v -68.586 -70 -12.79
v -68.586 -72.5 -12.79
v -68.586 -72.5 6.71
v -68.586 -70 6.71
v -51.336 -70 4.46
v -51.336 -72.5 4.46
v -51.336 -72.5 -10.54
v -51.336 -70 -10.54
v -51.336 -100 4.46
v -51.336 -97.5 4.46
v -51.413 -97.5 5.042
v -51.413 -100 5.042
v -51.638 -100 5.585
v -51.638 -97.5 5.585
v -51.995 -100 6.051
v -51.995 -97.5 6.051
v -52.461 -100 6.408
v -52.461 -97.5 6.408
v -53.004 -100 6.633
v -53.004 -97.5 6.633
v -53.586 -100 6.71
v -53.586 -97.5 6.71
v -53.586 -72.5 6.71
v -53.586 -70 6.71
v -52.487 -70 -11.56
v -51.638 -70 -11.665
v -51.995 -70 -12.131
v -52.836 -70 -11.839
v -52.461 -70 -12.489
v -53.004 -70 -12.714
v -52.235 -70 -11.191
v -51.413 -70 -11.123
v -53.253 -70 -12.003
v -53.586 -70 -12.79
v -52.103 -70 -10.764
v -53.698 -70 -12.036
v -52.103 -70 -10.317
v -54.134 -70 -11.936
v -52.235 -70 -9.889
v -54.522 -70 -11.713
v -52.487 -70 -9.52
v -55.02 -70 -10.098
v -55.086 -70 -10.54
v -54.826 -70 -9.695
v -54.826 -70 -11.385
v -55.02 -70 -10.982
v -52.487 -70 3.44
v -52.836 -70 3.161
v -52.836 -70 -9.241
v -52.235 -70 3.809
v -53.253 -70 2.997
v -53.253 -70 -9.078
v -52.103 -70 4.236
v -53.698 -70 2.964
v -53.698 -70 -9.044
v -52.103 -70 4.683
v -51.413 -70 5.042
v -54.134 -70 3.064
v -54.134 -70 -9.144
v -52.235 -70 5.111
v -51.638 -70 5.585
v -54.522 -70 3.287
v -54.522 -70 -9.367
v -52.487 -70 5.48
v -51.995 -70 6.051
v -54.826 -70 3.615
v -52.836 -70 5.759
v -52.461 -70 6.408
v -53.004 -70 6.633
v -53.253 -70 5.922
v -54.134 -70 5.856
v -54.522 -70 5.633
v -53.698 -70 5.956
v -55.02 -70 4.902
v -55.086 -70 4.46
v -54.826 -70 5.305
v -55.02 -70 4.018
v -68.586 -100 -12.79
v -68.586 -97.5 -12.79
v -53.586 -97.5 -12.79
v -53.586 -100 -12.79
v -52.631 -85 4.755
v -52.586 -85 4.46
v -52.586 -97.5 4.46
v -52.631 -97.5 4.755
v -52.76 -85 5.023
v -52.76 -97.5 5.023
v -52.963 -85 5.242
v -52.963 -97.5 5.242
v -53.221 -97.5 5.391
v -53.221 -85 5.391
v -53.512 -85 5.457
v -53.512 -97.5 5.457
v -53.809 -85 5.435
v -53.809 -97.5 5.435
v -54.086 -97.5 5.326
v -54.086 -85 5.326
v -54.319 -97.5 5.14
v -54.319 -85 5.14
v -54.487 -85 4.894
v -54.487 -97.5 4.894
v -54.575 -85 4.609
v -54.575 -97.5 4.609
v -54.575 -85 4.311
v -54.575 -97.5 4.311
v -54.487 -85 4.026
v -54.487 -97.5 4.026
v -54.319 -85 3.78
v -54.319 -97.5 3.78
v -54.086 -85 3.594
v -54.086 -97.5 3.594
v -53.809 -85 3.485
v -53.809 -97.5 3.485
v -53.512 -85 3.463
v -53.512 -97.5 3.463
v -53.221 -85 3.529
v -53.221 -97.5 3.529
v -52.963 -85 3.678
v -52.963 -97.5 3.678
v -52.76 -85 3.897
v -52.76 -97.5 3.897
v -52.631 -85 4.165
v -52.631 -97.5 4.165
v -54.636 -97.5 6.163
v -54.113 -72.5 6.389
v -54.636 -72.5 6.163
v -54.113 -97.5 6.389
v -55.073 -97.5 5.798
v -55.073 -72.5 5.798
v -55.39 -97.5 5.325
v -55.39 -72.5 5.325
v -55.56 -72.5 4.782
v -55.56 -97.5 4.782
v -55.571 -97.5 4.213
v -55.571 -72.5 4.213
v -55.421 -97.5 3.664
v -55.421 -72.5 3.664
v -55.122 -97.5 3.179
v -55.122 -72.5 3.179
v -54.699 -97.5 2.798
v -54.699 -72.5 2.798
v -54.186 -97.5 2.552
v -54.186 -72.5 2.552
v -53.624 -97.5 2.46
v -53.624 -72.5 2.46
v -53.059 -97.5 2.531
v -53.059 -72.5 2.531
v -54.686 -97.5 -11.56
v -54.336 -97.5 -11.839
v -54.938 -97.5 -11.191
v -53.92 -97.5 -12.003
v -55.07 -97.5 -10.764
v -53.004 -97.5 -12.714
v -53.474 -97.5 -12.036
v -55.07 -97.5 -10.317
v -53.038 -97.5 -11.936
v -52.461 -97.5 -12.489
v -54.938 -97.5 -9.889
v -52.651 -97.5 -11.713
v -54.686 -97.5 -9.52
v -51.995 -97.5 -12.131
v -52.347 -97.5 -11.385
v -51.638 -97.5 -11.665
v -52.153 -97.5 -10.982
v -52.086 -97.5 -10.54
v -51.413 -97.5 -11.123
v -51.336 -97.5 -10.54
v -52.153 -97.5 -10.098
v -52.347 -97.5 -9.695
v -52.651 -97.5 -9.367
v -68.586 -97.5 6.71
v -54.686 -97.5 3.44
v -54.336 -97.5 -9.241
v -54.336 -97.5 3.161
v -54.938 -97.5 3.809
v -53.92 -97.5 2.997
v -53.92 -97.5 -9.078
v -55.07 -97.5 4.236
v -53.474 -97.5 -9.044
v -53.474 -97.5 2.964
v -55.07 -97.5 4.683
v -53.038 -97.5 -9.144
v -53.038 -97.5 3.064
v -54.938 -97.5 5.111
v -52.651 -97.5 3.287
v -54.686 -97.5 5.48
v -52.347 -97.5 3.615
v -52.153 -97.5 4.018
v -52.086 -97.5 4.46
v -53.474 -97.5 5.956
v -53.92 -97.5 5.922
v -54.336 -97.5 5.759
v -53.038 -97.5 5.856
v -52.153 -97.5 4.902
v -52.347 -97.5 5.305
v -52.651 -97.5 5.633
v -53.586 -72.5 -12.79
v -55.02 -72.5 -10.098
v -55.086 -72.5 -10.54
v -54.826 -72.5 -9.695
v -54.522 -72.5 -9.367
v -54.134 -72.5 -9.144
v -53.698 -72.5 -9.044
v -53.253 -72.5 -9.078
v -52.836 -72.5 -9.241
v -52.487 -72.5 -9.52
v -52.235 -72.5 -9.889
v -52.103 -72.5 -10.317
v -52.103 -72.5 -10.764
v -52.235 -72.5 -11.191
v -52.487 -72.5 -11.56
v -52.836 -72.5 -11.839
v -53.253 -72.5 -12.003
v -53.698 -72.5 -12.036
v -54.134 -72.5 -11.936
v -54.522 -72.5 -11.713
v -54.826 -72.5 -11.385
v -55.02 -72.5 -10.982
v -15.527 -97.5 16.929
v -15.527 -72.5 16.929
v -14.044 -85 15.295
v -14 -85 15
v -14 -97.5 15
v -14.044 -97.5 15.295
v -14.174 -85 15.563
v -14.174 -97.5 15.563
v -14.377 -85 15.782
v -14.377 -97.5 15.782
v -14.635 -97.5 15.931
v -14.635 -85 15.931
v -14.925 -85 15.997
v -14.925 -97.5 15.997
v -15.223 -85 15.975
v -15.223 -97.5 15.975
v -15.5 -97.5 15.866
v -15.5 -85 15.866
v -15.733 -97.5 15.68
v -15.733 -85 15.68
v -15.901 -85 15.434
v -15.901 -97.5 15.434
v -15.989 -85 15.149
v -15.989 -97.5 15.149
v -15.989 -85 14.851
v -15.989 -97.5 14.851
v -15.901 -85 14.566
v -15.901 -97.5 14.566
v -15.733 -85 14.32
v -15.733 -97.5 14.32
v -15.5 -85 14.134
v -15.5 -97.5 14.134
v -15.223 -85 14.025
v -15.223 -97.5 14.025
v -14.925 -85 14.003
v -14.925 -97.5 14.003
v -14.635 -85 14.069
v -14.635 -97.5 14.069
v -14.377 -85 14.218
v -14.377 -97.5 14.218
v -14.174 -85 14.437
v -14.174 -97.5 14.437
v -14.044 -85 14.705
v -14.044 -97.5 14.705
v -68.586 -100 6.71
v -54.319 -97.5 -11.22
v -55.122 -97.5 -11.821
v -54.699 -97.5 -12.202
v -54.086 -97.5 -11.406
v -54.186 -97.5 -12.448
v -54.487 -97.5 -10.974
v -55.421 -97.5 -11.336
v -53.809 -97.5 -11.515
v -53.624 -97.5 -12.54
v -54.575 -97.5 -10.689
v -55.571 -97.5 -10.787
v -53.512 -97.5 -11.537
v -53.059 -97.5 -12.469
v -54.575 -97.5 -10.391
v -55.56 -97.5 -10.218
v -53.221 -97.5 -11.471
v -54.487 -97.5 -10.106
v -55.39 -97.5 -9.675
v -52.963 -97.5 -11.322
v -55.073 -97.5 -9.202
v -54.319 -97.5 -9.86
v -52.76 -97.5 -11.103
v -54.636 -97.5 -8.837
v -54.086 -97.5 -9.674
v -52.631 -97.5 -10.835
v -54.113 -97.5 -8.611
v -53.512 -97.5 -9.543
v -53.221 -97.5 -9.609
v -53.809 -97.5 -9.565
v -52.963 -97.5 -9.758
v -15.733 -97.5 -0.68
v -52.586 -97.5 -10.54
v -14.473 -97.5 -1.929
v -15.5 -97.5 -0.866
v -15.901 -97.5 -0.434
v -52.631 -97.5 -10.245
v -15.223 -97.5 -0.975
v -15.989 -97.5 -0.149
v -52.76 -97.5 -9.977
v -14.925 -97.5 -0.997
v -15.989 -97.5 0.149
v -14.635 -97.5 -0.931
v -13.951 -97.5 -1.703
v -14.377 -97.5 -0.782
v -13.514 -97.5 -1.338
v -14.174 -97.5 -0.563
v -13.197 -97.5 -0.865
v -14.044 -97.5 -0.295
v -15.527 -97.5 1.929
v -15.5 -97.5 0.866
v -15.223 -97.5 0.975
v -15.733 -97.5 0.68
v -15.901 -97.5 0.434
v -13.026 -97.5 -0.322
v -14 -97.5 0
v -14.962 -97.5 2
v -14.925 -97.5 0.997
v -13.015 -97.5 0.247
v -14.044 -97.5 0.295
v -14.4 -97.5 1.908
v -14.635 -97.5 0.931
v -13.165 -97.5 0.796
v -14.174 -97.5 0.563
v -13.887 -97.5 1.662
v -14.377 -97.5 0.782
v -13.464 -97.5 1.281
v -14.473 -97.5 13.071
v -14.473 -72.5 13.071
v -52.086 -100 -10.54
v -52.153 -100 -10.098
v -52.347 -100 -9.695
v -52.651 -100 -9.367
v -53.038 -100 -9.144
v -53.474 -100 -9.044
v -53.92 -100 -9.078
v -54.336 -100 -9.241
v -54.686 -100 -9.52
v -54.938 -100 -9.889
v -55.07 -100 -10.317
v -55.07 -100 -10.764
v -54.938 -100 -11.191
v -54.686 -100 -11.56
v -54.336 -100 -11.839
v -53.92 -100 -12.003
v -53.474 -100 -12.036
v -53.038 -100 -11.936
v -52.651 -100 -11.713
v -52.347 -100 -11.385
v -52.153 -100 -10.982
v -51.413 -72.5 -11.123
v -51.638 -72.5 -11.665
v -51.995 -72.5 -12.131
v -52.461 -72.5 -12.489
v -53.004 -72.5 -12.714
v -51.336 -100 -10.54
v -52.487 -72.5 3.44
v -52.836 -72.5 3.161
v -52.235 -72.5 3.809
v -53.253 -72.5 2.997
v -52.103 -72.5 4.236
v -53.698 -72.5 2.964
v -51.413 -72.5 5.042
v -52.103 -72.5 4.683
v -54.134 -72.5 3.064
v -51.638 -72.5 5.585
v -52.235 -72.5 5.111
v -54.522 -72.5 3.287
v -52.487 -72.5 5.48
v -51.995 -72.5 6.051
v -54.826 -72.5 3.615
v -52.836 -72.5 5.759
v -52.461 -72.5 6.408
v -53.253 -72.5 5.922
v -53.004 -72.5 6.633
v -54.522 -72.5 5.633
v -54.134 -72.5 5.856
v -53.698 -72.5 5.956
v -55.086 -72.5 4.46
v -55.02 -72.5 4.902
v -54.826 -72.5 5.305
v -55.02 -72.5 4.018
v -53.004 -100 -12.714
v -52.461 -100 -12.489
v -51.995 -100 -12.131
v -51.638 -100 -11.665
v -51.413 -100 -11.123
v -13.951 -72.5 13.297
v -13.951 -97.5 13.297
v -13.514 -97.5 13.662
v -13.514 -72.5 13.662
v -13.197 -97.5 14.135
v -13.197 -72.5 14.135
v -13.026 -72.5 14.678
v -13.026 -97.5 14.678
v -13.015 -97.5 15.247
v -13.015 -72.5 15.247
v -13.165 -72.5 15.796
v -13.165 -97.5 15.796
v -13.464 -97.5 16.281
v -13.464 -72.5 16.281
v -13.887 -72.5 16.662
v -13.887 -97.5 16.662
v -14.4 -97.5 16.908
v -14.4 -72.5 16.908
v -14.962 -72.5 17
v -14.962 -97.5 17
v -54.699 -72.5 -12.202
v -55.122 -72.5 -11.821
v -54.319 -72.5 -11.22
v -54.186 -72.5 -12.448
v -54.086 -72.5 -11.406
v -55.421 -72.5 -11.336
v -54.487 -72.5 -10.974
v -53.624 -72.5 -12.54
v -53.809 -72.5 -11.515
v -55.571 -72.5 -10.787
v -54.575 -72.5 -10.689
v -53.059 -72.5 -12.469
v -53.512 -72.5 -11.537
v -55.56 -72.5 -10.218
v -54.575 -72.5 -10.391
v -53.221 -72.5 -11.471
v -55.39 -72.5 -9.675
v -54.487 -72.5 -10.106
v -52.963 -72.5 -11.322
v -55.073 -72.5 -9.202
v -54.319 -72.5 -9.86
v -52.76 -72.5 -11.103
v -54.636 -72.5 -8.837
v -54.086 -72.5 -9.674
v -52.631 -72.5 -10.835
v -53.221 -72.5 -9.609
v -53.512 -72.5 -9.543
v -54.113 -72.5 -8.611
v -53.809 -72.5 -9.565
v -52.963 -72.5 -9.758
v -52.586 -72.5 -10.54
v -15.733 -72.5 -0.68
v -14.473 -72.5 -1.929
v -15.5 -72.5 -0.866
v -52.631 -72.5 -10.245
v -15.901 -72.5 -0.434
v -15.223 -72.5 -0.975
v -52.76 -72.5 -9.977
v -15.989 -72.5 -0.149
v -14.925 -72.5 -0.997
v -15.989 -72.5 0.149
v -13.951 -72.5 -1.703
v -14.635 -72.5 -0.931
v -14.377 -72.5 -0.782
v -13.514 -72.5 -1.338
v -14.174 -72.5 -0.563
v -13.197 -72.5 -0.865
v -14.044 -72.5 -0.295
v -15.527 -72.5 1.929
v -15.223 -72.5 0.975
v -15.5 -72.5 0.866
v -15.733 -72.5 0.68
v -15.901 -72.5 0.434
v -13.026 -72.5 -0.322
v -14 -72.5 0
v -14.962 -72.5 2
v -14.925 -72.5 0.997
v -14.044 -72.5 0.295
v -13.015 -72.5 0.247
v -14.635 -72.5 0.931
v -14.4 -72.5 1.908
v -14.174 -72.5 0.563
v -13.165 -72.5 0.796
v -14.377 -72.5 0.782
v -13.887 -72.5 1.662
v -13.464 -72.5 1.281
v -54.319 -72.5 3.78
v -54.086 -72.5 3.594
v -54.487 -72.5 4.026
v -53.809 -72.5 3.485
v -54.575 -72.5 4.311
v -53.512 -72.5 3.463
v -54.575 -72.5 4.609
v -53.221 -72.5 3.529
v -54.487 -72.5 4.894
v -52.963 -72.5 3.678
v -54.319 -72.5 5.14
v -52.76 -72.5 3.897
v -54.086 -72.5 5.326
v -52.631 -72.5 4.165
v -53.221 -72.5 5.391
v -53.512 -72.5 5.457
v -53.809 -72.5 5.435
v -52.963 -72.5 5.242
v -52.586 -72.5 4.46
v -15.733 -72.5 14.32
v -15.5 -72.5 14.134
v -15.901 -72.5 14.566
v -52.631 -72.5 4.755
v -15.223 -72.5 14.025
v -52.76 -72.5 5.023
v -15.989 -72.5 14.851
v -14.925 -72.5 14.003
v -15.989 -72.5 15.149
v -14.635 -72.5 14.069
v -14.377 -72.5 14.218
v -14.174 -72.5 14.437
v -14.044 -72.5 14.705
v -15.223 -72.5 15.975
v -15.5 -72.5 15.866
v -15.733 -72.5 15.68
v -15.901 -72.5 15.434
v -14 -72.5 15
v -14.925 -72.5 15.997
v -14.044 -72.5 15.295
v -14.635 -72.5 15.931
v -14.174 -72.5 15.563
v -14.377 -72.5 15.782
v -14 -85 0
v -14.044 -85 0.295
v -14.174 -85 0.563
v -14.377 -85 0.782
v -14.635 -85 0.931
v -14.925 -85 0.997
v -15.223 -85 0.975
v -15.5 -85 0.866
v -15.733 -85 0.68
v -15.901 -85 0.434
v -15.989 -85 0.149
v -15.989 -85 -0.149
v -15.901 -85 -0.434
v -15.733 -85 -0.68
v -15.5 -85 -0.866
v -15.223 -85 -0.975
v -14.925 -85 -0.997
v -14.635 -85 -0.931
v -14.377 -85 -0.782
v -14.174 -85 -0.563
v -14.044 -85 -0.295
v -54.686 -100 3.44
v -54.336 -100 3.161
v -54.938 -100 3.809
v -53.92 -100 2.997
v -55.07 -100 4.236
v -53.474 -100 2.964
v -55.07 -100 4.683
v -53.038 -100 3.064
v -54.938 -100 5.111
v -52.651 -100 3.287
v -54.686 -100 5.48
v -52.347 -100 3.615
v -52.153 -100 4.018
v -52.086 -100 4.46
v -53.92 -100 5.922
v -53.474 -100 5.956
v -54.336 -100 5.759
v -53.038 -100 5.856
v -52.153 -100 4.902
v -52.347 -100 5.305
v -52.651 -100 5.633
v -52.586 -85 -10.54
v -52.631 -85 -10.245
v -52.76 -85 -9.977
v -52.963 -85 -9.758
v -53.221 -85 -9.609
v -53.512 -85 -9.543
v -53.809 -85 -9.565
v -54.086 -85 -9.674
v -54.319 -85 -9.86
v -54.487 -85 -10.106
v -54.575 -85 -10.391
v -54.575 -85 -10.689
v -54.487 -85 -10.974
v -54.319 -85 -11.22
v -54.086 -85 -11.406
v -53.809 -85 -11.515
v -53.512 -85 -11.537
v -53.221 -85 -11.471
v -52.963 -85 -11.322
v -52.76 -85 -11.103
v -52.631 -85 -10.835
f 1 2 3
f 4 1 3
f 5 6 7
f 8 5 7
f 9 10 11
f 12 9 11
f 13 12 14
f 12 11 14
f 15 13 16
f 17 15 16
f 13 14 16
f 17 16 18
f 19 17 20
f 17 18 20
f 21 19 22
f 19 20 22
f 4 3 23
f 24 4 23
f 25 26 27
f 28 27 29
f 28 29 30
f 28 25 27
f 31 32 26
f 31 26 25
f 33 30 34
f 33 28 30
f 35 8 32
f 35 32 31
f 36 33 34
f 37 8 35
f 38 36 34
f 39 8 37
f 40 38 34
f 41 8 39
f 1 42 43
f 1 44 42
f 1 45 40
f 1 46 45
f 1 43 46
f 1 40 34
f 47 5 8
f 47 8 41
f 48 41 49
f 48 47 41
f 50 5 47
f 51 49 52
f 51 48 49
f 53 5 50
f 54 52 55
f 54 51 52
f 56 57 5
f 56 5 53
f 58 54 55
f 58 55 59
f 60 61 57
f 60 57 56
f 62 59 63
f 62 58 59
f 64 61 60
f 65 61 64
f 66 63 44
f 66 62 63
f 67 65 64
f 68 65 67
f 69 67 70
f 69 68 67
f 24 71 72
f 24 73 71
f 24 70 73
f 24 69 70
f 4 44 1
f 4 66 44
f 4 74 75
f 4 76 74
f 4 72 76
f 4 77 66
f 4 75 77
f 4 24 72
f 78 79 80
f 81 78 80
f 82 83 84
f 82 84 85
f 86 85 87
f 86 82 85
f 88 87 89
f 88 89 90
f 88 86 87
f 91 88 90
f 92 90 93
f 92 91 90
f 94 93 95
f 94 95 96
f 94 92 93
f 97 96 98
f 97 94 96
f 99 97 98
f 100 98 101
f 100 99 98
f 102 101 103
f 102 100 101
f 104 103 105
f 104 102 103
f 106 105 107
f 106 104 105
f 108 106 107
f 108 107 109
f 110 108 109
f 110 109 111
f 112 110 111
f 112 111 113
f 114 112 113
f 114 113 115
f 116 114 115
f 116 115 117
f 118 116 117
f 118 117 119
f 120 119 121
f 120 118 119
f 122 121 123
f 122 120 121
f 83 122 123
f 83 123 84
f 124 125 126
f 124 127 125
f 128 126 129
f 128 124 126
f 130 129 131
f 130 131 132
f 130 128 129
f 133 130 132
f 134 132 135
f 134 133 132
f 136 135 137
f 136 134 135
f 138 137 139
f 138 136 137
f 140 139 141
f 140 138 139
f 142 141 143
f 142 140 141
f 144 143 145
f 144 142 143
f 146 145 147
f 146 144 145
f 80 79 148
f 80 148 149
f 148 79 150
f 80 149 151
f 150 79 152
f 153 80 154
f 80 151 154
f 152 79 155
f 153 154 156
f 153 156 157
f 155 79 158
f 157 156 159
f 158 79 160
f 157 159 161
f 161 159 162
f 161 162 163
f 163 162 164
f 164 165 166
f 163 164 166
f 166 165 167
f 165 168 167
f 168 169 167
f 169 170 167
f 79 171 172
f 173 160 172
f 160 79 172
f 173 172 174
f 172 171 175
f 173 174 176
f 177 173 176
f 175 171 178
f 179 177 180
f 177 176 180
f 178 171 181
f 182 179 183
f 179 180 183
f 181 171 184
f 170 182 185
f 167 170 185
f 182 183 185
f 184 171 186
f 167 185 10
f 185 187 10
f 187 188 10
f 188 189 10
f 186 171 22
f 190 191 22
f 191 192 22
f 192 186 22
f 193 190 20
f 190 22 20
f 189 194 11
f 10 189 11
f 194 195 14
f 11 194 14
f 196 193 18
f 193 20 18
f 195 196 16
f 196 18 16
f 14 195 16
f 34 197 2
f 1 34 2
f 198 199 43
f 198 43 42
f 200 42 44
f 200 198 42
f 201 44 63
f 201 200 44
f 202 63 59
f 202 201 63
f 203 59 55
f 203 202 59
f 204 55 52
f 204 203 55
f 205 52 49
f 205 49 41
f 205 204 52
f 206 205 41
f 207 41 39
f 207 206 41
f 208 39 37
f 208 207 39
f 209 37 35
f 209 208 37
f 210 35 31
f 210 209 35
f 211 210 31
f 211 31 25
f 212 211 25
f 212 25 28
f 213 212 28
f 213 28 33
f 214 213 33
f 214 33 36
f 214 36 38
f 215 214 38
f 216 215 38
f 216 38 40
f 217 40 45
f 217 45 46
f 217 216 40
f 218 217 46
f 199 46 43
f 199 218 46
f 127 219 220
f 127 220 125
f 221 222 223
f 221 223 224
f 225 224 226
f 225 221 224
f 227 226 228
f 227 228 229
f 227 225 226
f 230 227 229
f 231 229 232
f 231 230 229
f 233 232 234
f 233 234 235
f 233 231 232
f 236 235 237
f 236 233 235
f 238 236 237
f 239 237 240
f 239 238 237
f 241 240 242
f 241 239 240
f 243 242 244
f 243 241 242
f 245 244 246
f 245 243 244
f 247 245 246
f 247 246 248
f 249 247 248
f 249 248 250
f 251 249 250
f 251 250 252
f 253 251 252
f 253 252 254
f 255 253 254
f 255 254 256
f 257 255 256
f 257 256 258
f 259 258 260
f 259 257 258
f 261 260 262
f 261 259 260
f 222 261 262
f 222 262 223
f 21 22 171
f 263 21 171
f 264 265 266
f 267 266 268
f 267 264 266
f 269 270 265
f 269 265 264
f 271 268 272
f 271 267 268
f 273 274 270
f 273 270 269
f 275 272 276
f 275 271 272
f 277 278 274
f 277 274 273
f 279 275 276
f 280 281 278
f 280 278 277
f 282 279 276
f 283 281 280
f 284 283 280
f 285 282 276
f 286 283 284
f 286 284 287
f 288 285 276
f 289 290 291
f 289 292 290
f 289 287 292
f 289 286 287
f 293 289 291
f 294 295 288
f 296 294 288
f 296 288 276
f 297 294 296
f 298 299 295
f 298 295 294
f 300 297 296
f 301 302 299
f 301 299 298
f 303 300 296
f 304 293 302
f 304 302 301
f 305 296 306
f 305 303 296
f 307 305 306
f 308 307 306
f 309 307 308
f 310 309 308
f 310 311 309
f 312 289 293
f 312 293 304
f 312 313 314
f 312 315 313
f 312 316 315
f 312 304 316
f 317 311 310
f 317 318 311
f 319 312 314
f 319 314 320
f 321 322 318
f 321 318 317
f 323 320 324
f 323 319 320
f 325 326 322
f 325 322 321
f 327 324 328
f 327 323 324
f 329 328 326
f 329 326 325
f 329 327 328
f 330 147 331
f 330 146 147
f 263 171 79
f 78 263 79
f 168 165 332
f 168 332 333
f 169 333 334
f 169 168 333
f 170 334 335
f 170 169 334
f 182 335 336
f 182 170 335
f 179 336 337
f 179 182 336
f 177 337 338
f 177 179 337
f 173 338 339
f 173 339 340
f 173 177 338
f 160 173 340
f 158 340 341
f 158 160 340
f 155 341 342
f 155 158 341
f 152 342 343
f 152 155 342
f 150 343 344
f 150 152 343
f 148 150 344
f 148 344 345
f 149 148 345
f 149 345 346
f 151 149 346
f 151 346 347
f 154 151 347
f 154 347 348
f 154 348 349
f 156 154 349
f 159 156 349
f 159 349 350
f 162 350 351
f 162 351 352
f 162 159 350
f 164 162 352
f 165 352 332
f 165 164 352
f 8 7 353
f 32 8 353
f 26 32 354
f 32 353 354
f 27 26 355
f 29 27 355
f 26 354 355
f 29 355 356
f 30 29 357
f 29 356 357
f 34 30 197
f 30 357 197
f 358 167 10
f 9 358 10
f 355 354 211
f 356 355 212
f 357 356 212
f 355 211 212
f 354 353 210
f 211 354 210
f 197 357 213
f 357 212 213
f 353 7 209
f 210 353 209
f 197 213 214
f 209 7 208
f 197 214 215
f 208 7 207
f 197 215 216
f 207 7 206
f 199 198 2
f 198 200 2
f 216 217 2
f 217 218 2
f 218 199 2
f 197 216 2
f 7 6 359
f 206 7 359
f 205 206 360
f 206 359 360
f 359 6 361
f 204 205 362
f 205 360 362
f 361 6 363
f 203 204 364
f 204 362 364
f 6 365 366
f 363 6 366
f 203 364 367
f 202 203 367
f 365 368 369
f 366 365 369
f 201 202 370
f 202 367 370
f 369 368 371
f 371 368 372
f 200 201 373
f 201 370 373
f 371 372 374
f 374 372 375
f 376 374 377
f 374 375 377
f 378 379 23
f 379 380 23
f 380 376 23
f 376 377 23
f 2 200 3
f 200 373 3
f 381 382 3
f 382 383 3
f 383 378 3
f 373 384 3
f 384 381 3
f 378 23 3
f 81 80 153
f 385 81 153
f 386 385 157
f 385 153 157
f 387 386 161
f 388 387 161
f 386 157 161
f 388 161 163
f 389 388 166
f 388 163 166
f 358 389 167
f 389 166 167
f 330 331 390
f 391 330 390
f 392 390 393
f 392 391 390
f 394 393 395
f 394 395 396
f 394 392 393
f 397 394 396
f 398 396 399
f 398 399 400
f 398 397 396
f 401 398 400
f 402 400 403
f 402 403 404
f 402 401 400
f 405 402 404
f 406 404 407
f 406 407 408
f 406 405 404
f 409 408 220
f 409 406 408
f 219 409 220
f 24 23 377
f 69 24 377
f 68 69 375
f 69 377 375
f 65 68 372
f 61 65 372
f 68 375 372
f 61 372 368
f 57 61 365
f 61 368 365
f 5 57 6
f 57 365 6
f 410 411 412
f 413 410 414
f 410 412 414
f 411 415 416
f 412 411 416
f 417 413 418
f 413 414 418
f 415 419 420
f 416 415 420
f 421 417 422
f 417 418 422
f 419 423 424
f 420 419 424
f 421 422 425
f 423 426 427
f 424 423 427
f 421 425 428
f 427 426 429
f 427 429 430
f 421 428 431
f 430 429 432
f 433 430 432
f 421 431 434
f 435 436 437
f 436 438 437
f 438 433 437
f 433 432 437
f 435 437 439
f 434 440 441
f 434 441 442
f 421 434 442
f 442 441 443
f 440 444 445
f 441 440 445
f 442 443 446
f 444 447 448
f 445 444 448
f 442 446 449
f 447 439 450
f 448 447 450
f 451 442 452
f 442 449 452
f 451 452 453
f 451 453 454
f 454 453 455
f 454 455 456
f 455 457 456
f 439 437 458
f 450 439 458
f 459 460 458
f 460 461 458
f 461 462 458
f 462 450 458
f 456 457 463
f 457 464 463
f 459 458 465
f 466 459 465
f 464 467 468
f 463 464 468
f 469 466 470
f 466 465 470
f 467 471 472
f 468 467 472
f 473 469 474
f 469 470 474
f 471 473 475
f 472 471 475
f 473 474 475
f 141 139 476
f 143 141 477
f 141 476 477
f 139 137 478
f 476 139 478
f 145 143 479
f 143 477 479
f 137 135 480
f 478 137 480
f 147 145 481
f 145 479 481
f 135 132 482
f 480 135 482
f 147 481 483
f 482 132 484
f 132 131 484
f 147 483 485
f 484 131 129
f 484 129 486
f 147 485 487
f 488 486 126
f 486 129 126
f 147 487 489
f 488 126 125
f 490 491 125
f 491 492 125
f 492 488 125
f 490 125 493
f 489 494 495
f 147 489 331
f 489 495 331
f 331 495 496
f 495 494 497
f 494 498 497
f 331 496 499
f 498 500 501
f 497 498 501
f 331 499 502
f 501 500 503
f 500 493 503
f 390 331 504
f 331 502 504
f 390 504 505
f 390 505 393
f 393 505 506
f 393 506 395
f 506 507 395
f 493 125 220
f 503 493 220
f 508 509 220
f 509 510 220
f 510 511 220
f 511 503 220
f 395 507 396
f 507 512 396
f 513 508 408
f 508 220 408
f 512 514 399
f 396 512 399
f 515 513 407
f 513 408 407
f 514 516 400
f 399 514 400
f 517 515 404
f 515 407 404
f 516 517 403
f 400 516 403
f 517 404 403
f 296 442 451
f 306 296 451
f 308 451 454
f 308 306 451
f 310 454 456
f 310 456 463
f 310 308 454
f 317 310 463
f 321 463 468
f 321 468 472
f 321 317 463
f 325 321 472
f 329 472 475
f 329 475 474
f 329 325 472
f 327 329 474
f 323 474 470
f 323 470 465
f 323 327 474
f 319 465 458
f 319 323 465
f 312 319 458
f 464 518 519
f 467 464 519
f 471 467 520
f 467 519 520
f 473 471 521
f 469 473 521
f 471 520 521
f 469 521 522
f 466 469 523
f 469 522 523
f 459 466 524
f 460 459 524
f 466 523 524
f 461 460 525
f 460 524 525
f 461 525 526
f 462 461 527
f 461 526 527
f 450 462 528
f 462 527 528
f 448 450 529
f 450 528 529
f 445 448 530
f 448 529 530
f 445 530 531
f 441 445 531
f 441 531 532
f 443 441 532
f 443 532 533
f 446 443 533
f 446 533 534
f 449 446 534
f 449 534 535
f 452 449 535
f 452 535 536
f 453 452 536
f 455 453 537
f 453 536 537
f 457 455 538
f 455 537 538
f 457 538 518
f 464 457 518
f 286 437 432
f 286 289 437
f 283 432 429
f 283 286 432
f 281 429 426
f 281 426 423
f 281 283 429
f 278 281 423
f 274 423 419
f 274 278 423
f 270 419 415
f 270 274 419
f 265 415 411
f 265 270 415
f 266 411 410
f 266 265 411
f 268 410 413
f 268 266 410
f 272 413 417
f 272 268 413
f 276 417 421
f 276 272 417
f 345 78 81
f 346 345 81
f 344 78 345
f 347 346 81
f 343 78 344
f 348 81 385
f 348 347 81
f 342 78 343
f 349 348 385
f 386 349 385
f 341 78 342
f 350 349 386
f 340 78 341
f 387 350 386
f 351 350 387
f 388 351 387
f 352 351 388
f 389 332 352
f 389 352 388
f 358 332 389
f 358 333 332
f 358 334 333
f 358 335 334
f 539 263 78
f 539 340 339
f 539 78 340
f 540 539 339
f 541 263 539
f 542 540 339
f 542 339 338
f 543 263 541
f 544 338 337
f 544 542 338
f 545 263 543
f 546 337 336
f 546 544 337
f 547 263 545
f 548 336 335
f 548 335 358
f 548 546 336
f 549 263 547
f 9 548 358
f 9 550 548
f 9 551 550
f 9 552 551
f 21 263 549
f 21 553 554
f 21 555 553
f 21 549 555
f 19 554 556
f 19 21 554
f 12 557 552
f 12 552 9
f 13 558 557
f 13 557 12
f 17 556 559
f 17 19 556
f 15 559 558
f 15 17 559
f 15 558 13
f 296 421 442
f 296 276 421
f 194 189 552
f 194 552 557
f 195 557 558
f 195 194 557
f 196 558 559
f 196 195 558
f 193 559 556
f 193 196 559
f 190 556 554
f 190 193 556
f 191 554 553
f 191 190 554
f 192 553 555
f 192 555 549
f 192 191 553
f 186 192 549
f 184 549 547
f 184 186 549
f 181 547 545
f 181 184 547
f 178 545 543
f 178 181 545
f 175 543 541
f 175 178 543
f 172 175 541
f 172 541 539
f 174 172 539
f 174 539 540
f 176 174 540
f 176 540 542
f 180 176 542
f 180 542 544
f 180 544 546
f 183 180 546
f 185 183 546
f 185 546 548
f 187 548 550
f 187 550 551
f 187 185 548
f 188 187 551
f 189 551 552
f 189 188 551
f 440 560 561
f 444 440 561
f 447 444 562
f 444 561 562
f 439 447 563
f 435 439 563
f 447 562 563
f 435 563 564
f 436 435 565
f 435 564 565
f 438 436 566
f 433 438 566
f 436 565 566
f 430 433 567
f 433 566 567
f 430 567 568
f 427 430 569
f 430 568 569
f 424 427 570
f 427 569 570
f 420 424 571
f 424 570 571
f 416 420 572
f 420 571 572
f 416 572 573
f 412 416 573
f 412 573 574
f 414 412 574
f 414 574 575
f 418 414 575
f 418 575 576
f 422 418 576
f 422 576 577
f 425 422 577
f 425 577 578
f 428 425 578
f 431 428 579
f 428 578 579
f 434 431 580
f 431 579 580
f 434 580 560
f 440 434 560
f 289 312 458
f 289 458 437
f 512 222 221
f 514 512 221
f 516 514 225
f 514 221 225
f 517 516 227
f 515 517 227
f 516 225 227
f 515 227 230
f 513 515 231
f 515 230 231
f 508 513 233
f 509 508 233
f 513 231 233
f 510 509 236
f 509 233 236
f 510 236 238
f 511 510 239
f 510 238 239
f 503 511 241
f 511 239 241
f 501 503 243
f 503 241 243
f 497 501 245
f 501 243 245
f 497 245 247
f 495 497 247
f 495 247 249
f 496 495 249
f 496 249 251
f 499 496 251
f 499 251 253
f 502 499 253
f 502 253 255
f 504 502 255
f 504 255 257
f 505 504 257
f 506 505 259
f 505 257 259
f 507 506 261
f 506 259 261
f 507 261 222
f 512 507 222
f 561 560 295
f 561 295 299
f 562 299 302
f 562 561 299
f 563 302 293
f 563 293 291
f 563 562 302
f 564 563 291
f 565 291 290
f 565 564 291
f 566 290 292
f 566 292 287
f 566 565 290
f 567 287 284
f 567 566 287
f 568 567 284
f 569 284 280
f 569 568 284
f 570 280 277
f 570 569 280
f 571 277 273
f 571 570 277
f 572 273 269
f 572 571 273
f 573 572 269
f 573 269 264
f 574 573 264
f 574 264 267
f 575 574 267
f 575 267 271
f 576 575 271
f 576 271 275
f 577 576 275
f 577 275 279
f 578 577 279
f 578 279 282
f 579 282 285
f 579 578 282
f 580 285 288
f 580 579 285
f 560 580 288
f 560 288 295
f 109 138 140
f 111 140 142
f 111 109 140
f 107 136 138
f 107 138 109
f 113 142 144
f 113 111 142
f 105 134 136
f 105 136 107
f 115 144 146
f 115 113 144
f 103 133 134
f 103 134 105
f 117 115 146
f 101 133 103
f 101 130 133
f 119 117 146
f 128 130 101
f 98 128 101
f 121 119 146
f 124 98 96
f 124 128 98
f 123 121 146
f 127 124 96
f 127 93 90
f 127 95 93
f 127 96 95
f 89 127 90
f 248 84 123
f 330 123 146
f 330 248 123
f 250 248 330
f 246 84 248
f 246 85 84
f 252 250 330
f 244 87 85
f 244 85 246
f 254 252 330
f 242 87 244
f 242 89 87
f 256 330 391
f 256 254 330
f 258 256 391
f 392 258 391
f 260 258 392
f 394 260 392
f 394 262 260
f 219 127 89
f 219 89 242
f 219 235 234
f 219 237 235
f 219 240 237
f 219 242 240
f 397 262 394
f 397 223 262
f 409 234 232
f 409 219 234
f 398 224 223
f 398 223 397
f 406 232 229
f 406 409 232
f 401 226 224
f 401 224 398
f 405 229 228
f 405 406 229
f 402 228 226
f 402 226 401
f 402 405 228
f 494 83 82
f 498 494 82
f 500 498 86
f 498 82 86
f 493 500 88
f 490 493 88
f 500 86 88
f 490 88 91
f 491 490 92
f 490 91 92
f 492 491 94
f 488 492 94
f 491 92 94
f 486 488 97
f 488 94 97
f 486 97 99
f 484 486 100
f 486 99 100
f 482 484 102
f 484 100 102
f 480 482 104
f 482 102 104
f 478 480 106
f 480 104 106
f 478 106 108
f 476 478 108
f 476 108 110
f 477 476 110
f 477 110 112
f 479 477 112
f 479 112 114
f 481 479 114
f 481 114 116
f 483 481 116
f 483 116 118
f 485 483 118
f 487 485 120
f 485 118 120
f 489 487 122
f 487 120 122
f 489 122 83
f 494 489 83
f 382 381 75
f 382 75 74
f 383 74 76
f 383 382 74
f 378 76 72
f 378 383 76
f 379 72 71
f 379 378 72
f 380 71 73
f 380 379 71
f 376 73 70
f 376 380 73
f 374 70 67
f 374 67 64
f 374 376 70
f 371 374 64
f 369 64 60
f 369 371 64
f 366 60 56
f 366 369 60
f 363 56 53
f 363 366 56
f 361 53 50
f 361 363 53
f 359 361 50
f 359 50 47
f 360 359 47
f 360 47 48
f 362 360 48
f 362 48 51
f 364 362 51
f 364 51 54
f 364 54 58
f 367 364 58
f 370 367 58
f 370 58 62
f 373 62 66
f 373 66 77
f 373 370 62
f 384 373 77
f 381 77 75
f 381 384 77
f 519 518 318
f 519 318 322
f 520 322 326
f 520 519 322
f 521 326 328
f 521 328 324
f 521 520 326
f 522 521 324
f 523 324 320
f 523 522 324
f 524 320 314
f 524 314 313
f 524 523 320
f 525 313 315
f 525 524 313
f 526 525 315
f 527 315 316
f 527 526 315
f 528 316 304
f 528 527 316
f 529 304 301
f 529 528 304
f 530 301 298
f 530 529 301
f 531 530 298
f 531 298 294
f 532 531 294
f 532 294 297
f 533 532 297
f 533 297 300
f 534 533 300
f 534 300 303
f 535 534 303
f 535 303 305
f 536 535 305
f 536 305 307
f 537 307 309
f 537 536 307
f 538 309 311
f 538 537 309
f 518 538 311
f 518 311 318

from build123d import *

# Parameters (mm, degrees)
F6_R          = 1
F7_DEPTH      = 12.5
F7_DEPTH_BACK = 12.5
F8_R          = 1.5
F9_DEPTH      = 2.5
F10_R         = 1.5
F11_DEPTH     = 2.5


with BuildPart() as f7:
    # F6 (on plane+point) → F7 (new body, two sides)
    with BuildSketch(Plane.XZ.offset(85)) as f7_sk:
        with BuildLine():
            Line((-53.0593214085, 2.5305150899), (-14.4729915791, 13.0706835085))
            ThreePointArc((-14.4729915791, 13.0706835085), (-13.0706835085, 15.5270084209), (-15.5270084209, 16.9293164915))
            Line((-15.5270084209, 16.9293164915), (-54.1133382504, 6.3891480729))
            ThreePointArc((-54.1133382504, 6.3891480729), (-55.5156463209, 3.9328231605), (-53.0593214085, 2.5305150899))
        make_face()
        with Locations((-53.5863298295, 4.4598315814)):
            Circle(F6_R, mode=Mode.SUBTRACT)
        with Locations((-15, 15)):
            Circle(F6_R, mode=Mode.SUBTRACT)
    extrude(amount=F7_DEPTH)
    extrude(f7_sk.sketch, amount=-F7_DEPTH_BACK)


with BuildPart() as f7b:
    # F6 (on plane+point) → F7, piece 2 (new body, two sides)
    with BuildSketch(Plane.XZ.offset(85)) as f7_2_sk:
        with BuildLine():
            Line((-53.0593214085, -12.4694849101), (-14.4729915791, -1.9293164915))
            ThreePointArc((-14.4729915791, -1.9293164915), (-13.0706835085, 0.5270084209), (-15.5270084209, 1.9293164915))
            Line((-15.5270084209, 1.9293164915), (-54.1133382504, -8.6108519271))
            ThreePointArc((-54.1133382504, -8.6108519271), (-55.5156463209, -11.0671768395), (-53.0593214085, -12.4694849101))
        make_face()
        with Locations((-53.5863298295, -10.5401684186)):
            Circle(F6_R, mode=Mode.SUBTRACT)
        with Locations((-15, 0)):
            Circle(F6_R, mode=Mode.SUBTRACT)
    extrude(amount=F7_DEPTH)
    extrude(f7_2_sk.sketch, amount=-F7_DEPTH_BACK)


with BuildPart() as f9:
    # F8 (on face) → F9 (new body)
    with BuildSketch(Plane.XZ.offset(97.5)):
        with BuildLine():
            Line((-53.5863298295, 6.7098315814), (-68.5863298295, 6.7098315814))
            Line((-68.5863298295, 6.7098315814), (-68.5863298295, -12.7901684186))
            Line((-68.5863298295, -12.7901684186), (-53.5863298295, -12.7901684186))
            ThreePointArc((-53.5863298295, -12.7901684186), (-51.9953395718, -12.1311586763), (-51.3363298295, -10.5401684186))
            Line((-51.3363298295, -10.5401684186), (-51.3363298295, 4.4598315814))
            ThreePointArc((-51.3363298295, 4.4598315814), (-51.9953395718, 6.0508218391), (-53.5863298295, 6.7098315814))
        make_face()
        with Locations((-53.5863298295, -10.5401684186)):
            Circle(F8_R, mode=Mode.SUBTRACT)
        with Locations((-53.5863298295, 4.4598315814)):
            Circle(F8_R, mode=Mode.SUBTRACT)
    extrude(amount=F9_DEPTH)


with BuildPart() as f11:
    # F10 (on face) → F11 (new body)
    with BuildSketch(Plane(origin=(0, -72.5, 0), x_dir=(-1, 0, 0), z_dir=(0, 1, 0))):
        with BuildLine():
            Line((68.5863298295, -12.7901684186), (68.5863298295, 6.7098315814))
            Line((68.5863298295, 6.7098315814), (53.5863298295, 6.7098315814))
            ThreePointArc((53.5863298295, 6.7098315814), (51.9953395718, 6.0508218391), (51.3363298295, 4.4598315814))
            Line((51.3363298295, 4.4598315814), (51.3363298295, -10.5401684186))
            ThreePointArc((51.3363298295, -10.5401684186), (51.9953395718, -12.1311586763), (53.5863298295, -12.7901684186))
            Line((53.5863298295, -12.7901684186), (68.5863298295, -12.7901684186))
        make_face()
        with Locations((53.5863298295, -10.5401684186)):
            Circle(F10_R, mode=Mode.SUBTRACT)
        with Locations((53.5863298295, 4.4598315814)):
            Circle(F10_R, mode=Mode.SUBTRACT)
    extrude(amount=F11_DEPTH)


solid = Compound([f7.part, f7b.part, f9.part, f11.part])
